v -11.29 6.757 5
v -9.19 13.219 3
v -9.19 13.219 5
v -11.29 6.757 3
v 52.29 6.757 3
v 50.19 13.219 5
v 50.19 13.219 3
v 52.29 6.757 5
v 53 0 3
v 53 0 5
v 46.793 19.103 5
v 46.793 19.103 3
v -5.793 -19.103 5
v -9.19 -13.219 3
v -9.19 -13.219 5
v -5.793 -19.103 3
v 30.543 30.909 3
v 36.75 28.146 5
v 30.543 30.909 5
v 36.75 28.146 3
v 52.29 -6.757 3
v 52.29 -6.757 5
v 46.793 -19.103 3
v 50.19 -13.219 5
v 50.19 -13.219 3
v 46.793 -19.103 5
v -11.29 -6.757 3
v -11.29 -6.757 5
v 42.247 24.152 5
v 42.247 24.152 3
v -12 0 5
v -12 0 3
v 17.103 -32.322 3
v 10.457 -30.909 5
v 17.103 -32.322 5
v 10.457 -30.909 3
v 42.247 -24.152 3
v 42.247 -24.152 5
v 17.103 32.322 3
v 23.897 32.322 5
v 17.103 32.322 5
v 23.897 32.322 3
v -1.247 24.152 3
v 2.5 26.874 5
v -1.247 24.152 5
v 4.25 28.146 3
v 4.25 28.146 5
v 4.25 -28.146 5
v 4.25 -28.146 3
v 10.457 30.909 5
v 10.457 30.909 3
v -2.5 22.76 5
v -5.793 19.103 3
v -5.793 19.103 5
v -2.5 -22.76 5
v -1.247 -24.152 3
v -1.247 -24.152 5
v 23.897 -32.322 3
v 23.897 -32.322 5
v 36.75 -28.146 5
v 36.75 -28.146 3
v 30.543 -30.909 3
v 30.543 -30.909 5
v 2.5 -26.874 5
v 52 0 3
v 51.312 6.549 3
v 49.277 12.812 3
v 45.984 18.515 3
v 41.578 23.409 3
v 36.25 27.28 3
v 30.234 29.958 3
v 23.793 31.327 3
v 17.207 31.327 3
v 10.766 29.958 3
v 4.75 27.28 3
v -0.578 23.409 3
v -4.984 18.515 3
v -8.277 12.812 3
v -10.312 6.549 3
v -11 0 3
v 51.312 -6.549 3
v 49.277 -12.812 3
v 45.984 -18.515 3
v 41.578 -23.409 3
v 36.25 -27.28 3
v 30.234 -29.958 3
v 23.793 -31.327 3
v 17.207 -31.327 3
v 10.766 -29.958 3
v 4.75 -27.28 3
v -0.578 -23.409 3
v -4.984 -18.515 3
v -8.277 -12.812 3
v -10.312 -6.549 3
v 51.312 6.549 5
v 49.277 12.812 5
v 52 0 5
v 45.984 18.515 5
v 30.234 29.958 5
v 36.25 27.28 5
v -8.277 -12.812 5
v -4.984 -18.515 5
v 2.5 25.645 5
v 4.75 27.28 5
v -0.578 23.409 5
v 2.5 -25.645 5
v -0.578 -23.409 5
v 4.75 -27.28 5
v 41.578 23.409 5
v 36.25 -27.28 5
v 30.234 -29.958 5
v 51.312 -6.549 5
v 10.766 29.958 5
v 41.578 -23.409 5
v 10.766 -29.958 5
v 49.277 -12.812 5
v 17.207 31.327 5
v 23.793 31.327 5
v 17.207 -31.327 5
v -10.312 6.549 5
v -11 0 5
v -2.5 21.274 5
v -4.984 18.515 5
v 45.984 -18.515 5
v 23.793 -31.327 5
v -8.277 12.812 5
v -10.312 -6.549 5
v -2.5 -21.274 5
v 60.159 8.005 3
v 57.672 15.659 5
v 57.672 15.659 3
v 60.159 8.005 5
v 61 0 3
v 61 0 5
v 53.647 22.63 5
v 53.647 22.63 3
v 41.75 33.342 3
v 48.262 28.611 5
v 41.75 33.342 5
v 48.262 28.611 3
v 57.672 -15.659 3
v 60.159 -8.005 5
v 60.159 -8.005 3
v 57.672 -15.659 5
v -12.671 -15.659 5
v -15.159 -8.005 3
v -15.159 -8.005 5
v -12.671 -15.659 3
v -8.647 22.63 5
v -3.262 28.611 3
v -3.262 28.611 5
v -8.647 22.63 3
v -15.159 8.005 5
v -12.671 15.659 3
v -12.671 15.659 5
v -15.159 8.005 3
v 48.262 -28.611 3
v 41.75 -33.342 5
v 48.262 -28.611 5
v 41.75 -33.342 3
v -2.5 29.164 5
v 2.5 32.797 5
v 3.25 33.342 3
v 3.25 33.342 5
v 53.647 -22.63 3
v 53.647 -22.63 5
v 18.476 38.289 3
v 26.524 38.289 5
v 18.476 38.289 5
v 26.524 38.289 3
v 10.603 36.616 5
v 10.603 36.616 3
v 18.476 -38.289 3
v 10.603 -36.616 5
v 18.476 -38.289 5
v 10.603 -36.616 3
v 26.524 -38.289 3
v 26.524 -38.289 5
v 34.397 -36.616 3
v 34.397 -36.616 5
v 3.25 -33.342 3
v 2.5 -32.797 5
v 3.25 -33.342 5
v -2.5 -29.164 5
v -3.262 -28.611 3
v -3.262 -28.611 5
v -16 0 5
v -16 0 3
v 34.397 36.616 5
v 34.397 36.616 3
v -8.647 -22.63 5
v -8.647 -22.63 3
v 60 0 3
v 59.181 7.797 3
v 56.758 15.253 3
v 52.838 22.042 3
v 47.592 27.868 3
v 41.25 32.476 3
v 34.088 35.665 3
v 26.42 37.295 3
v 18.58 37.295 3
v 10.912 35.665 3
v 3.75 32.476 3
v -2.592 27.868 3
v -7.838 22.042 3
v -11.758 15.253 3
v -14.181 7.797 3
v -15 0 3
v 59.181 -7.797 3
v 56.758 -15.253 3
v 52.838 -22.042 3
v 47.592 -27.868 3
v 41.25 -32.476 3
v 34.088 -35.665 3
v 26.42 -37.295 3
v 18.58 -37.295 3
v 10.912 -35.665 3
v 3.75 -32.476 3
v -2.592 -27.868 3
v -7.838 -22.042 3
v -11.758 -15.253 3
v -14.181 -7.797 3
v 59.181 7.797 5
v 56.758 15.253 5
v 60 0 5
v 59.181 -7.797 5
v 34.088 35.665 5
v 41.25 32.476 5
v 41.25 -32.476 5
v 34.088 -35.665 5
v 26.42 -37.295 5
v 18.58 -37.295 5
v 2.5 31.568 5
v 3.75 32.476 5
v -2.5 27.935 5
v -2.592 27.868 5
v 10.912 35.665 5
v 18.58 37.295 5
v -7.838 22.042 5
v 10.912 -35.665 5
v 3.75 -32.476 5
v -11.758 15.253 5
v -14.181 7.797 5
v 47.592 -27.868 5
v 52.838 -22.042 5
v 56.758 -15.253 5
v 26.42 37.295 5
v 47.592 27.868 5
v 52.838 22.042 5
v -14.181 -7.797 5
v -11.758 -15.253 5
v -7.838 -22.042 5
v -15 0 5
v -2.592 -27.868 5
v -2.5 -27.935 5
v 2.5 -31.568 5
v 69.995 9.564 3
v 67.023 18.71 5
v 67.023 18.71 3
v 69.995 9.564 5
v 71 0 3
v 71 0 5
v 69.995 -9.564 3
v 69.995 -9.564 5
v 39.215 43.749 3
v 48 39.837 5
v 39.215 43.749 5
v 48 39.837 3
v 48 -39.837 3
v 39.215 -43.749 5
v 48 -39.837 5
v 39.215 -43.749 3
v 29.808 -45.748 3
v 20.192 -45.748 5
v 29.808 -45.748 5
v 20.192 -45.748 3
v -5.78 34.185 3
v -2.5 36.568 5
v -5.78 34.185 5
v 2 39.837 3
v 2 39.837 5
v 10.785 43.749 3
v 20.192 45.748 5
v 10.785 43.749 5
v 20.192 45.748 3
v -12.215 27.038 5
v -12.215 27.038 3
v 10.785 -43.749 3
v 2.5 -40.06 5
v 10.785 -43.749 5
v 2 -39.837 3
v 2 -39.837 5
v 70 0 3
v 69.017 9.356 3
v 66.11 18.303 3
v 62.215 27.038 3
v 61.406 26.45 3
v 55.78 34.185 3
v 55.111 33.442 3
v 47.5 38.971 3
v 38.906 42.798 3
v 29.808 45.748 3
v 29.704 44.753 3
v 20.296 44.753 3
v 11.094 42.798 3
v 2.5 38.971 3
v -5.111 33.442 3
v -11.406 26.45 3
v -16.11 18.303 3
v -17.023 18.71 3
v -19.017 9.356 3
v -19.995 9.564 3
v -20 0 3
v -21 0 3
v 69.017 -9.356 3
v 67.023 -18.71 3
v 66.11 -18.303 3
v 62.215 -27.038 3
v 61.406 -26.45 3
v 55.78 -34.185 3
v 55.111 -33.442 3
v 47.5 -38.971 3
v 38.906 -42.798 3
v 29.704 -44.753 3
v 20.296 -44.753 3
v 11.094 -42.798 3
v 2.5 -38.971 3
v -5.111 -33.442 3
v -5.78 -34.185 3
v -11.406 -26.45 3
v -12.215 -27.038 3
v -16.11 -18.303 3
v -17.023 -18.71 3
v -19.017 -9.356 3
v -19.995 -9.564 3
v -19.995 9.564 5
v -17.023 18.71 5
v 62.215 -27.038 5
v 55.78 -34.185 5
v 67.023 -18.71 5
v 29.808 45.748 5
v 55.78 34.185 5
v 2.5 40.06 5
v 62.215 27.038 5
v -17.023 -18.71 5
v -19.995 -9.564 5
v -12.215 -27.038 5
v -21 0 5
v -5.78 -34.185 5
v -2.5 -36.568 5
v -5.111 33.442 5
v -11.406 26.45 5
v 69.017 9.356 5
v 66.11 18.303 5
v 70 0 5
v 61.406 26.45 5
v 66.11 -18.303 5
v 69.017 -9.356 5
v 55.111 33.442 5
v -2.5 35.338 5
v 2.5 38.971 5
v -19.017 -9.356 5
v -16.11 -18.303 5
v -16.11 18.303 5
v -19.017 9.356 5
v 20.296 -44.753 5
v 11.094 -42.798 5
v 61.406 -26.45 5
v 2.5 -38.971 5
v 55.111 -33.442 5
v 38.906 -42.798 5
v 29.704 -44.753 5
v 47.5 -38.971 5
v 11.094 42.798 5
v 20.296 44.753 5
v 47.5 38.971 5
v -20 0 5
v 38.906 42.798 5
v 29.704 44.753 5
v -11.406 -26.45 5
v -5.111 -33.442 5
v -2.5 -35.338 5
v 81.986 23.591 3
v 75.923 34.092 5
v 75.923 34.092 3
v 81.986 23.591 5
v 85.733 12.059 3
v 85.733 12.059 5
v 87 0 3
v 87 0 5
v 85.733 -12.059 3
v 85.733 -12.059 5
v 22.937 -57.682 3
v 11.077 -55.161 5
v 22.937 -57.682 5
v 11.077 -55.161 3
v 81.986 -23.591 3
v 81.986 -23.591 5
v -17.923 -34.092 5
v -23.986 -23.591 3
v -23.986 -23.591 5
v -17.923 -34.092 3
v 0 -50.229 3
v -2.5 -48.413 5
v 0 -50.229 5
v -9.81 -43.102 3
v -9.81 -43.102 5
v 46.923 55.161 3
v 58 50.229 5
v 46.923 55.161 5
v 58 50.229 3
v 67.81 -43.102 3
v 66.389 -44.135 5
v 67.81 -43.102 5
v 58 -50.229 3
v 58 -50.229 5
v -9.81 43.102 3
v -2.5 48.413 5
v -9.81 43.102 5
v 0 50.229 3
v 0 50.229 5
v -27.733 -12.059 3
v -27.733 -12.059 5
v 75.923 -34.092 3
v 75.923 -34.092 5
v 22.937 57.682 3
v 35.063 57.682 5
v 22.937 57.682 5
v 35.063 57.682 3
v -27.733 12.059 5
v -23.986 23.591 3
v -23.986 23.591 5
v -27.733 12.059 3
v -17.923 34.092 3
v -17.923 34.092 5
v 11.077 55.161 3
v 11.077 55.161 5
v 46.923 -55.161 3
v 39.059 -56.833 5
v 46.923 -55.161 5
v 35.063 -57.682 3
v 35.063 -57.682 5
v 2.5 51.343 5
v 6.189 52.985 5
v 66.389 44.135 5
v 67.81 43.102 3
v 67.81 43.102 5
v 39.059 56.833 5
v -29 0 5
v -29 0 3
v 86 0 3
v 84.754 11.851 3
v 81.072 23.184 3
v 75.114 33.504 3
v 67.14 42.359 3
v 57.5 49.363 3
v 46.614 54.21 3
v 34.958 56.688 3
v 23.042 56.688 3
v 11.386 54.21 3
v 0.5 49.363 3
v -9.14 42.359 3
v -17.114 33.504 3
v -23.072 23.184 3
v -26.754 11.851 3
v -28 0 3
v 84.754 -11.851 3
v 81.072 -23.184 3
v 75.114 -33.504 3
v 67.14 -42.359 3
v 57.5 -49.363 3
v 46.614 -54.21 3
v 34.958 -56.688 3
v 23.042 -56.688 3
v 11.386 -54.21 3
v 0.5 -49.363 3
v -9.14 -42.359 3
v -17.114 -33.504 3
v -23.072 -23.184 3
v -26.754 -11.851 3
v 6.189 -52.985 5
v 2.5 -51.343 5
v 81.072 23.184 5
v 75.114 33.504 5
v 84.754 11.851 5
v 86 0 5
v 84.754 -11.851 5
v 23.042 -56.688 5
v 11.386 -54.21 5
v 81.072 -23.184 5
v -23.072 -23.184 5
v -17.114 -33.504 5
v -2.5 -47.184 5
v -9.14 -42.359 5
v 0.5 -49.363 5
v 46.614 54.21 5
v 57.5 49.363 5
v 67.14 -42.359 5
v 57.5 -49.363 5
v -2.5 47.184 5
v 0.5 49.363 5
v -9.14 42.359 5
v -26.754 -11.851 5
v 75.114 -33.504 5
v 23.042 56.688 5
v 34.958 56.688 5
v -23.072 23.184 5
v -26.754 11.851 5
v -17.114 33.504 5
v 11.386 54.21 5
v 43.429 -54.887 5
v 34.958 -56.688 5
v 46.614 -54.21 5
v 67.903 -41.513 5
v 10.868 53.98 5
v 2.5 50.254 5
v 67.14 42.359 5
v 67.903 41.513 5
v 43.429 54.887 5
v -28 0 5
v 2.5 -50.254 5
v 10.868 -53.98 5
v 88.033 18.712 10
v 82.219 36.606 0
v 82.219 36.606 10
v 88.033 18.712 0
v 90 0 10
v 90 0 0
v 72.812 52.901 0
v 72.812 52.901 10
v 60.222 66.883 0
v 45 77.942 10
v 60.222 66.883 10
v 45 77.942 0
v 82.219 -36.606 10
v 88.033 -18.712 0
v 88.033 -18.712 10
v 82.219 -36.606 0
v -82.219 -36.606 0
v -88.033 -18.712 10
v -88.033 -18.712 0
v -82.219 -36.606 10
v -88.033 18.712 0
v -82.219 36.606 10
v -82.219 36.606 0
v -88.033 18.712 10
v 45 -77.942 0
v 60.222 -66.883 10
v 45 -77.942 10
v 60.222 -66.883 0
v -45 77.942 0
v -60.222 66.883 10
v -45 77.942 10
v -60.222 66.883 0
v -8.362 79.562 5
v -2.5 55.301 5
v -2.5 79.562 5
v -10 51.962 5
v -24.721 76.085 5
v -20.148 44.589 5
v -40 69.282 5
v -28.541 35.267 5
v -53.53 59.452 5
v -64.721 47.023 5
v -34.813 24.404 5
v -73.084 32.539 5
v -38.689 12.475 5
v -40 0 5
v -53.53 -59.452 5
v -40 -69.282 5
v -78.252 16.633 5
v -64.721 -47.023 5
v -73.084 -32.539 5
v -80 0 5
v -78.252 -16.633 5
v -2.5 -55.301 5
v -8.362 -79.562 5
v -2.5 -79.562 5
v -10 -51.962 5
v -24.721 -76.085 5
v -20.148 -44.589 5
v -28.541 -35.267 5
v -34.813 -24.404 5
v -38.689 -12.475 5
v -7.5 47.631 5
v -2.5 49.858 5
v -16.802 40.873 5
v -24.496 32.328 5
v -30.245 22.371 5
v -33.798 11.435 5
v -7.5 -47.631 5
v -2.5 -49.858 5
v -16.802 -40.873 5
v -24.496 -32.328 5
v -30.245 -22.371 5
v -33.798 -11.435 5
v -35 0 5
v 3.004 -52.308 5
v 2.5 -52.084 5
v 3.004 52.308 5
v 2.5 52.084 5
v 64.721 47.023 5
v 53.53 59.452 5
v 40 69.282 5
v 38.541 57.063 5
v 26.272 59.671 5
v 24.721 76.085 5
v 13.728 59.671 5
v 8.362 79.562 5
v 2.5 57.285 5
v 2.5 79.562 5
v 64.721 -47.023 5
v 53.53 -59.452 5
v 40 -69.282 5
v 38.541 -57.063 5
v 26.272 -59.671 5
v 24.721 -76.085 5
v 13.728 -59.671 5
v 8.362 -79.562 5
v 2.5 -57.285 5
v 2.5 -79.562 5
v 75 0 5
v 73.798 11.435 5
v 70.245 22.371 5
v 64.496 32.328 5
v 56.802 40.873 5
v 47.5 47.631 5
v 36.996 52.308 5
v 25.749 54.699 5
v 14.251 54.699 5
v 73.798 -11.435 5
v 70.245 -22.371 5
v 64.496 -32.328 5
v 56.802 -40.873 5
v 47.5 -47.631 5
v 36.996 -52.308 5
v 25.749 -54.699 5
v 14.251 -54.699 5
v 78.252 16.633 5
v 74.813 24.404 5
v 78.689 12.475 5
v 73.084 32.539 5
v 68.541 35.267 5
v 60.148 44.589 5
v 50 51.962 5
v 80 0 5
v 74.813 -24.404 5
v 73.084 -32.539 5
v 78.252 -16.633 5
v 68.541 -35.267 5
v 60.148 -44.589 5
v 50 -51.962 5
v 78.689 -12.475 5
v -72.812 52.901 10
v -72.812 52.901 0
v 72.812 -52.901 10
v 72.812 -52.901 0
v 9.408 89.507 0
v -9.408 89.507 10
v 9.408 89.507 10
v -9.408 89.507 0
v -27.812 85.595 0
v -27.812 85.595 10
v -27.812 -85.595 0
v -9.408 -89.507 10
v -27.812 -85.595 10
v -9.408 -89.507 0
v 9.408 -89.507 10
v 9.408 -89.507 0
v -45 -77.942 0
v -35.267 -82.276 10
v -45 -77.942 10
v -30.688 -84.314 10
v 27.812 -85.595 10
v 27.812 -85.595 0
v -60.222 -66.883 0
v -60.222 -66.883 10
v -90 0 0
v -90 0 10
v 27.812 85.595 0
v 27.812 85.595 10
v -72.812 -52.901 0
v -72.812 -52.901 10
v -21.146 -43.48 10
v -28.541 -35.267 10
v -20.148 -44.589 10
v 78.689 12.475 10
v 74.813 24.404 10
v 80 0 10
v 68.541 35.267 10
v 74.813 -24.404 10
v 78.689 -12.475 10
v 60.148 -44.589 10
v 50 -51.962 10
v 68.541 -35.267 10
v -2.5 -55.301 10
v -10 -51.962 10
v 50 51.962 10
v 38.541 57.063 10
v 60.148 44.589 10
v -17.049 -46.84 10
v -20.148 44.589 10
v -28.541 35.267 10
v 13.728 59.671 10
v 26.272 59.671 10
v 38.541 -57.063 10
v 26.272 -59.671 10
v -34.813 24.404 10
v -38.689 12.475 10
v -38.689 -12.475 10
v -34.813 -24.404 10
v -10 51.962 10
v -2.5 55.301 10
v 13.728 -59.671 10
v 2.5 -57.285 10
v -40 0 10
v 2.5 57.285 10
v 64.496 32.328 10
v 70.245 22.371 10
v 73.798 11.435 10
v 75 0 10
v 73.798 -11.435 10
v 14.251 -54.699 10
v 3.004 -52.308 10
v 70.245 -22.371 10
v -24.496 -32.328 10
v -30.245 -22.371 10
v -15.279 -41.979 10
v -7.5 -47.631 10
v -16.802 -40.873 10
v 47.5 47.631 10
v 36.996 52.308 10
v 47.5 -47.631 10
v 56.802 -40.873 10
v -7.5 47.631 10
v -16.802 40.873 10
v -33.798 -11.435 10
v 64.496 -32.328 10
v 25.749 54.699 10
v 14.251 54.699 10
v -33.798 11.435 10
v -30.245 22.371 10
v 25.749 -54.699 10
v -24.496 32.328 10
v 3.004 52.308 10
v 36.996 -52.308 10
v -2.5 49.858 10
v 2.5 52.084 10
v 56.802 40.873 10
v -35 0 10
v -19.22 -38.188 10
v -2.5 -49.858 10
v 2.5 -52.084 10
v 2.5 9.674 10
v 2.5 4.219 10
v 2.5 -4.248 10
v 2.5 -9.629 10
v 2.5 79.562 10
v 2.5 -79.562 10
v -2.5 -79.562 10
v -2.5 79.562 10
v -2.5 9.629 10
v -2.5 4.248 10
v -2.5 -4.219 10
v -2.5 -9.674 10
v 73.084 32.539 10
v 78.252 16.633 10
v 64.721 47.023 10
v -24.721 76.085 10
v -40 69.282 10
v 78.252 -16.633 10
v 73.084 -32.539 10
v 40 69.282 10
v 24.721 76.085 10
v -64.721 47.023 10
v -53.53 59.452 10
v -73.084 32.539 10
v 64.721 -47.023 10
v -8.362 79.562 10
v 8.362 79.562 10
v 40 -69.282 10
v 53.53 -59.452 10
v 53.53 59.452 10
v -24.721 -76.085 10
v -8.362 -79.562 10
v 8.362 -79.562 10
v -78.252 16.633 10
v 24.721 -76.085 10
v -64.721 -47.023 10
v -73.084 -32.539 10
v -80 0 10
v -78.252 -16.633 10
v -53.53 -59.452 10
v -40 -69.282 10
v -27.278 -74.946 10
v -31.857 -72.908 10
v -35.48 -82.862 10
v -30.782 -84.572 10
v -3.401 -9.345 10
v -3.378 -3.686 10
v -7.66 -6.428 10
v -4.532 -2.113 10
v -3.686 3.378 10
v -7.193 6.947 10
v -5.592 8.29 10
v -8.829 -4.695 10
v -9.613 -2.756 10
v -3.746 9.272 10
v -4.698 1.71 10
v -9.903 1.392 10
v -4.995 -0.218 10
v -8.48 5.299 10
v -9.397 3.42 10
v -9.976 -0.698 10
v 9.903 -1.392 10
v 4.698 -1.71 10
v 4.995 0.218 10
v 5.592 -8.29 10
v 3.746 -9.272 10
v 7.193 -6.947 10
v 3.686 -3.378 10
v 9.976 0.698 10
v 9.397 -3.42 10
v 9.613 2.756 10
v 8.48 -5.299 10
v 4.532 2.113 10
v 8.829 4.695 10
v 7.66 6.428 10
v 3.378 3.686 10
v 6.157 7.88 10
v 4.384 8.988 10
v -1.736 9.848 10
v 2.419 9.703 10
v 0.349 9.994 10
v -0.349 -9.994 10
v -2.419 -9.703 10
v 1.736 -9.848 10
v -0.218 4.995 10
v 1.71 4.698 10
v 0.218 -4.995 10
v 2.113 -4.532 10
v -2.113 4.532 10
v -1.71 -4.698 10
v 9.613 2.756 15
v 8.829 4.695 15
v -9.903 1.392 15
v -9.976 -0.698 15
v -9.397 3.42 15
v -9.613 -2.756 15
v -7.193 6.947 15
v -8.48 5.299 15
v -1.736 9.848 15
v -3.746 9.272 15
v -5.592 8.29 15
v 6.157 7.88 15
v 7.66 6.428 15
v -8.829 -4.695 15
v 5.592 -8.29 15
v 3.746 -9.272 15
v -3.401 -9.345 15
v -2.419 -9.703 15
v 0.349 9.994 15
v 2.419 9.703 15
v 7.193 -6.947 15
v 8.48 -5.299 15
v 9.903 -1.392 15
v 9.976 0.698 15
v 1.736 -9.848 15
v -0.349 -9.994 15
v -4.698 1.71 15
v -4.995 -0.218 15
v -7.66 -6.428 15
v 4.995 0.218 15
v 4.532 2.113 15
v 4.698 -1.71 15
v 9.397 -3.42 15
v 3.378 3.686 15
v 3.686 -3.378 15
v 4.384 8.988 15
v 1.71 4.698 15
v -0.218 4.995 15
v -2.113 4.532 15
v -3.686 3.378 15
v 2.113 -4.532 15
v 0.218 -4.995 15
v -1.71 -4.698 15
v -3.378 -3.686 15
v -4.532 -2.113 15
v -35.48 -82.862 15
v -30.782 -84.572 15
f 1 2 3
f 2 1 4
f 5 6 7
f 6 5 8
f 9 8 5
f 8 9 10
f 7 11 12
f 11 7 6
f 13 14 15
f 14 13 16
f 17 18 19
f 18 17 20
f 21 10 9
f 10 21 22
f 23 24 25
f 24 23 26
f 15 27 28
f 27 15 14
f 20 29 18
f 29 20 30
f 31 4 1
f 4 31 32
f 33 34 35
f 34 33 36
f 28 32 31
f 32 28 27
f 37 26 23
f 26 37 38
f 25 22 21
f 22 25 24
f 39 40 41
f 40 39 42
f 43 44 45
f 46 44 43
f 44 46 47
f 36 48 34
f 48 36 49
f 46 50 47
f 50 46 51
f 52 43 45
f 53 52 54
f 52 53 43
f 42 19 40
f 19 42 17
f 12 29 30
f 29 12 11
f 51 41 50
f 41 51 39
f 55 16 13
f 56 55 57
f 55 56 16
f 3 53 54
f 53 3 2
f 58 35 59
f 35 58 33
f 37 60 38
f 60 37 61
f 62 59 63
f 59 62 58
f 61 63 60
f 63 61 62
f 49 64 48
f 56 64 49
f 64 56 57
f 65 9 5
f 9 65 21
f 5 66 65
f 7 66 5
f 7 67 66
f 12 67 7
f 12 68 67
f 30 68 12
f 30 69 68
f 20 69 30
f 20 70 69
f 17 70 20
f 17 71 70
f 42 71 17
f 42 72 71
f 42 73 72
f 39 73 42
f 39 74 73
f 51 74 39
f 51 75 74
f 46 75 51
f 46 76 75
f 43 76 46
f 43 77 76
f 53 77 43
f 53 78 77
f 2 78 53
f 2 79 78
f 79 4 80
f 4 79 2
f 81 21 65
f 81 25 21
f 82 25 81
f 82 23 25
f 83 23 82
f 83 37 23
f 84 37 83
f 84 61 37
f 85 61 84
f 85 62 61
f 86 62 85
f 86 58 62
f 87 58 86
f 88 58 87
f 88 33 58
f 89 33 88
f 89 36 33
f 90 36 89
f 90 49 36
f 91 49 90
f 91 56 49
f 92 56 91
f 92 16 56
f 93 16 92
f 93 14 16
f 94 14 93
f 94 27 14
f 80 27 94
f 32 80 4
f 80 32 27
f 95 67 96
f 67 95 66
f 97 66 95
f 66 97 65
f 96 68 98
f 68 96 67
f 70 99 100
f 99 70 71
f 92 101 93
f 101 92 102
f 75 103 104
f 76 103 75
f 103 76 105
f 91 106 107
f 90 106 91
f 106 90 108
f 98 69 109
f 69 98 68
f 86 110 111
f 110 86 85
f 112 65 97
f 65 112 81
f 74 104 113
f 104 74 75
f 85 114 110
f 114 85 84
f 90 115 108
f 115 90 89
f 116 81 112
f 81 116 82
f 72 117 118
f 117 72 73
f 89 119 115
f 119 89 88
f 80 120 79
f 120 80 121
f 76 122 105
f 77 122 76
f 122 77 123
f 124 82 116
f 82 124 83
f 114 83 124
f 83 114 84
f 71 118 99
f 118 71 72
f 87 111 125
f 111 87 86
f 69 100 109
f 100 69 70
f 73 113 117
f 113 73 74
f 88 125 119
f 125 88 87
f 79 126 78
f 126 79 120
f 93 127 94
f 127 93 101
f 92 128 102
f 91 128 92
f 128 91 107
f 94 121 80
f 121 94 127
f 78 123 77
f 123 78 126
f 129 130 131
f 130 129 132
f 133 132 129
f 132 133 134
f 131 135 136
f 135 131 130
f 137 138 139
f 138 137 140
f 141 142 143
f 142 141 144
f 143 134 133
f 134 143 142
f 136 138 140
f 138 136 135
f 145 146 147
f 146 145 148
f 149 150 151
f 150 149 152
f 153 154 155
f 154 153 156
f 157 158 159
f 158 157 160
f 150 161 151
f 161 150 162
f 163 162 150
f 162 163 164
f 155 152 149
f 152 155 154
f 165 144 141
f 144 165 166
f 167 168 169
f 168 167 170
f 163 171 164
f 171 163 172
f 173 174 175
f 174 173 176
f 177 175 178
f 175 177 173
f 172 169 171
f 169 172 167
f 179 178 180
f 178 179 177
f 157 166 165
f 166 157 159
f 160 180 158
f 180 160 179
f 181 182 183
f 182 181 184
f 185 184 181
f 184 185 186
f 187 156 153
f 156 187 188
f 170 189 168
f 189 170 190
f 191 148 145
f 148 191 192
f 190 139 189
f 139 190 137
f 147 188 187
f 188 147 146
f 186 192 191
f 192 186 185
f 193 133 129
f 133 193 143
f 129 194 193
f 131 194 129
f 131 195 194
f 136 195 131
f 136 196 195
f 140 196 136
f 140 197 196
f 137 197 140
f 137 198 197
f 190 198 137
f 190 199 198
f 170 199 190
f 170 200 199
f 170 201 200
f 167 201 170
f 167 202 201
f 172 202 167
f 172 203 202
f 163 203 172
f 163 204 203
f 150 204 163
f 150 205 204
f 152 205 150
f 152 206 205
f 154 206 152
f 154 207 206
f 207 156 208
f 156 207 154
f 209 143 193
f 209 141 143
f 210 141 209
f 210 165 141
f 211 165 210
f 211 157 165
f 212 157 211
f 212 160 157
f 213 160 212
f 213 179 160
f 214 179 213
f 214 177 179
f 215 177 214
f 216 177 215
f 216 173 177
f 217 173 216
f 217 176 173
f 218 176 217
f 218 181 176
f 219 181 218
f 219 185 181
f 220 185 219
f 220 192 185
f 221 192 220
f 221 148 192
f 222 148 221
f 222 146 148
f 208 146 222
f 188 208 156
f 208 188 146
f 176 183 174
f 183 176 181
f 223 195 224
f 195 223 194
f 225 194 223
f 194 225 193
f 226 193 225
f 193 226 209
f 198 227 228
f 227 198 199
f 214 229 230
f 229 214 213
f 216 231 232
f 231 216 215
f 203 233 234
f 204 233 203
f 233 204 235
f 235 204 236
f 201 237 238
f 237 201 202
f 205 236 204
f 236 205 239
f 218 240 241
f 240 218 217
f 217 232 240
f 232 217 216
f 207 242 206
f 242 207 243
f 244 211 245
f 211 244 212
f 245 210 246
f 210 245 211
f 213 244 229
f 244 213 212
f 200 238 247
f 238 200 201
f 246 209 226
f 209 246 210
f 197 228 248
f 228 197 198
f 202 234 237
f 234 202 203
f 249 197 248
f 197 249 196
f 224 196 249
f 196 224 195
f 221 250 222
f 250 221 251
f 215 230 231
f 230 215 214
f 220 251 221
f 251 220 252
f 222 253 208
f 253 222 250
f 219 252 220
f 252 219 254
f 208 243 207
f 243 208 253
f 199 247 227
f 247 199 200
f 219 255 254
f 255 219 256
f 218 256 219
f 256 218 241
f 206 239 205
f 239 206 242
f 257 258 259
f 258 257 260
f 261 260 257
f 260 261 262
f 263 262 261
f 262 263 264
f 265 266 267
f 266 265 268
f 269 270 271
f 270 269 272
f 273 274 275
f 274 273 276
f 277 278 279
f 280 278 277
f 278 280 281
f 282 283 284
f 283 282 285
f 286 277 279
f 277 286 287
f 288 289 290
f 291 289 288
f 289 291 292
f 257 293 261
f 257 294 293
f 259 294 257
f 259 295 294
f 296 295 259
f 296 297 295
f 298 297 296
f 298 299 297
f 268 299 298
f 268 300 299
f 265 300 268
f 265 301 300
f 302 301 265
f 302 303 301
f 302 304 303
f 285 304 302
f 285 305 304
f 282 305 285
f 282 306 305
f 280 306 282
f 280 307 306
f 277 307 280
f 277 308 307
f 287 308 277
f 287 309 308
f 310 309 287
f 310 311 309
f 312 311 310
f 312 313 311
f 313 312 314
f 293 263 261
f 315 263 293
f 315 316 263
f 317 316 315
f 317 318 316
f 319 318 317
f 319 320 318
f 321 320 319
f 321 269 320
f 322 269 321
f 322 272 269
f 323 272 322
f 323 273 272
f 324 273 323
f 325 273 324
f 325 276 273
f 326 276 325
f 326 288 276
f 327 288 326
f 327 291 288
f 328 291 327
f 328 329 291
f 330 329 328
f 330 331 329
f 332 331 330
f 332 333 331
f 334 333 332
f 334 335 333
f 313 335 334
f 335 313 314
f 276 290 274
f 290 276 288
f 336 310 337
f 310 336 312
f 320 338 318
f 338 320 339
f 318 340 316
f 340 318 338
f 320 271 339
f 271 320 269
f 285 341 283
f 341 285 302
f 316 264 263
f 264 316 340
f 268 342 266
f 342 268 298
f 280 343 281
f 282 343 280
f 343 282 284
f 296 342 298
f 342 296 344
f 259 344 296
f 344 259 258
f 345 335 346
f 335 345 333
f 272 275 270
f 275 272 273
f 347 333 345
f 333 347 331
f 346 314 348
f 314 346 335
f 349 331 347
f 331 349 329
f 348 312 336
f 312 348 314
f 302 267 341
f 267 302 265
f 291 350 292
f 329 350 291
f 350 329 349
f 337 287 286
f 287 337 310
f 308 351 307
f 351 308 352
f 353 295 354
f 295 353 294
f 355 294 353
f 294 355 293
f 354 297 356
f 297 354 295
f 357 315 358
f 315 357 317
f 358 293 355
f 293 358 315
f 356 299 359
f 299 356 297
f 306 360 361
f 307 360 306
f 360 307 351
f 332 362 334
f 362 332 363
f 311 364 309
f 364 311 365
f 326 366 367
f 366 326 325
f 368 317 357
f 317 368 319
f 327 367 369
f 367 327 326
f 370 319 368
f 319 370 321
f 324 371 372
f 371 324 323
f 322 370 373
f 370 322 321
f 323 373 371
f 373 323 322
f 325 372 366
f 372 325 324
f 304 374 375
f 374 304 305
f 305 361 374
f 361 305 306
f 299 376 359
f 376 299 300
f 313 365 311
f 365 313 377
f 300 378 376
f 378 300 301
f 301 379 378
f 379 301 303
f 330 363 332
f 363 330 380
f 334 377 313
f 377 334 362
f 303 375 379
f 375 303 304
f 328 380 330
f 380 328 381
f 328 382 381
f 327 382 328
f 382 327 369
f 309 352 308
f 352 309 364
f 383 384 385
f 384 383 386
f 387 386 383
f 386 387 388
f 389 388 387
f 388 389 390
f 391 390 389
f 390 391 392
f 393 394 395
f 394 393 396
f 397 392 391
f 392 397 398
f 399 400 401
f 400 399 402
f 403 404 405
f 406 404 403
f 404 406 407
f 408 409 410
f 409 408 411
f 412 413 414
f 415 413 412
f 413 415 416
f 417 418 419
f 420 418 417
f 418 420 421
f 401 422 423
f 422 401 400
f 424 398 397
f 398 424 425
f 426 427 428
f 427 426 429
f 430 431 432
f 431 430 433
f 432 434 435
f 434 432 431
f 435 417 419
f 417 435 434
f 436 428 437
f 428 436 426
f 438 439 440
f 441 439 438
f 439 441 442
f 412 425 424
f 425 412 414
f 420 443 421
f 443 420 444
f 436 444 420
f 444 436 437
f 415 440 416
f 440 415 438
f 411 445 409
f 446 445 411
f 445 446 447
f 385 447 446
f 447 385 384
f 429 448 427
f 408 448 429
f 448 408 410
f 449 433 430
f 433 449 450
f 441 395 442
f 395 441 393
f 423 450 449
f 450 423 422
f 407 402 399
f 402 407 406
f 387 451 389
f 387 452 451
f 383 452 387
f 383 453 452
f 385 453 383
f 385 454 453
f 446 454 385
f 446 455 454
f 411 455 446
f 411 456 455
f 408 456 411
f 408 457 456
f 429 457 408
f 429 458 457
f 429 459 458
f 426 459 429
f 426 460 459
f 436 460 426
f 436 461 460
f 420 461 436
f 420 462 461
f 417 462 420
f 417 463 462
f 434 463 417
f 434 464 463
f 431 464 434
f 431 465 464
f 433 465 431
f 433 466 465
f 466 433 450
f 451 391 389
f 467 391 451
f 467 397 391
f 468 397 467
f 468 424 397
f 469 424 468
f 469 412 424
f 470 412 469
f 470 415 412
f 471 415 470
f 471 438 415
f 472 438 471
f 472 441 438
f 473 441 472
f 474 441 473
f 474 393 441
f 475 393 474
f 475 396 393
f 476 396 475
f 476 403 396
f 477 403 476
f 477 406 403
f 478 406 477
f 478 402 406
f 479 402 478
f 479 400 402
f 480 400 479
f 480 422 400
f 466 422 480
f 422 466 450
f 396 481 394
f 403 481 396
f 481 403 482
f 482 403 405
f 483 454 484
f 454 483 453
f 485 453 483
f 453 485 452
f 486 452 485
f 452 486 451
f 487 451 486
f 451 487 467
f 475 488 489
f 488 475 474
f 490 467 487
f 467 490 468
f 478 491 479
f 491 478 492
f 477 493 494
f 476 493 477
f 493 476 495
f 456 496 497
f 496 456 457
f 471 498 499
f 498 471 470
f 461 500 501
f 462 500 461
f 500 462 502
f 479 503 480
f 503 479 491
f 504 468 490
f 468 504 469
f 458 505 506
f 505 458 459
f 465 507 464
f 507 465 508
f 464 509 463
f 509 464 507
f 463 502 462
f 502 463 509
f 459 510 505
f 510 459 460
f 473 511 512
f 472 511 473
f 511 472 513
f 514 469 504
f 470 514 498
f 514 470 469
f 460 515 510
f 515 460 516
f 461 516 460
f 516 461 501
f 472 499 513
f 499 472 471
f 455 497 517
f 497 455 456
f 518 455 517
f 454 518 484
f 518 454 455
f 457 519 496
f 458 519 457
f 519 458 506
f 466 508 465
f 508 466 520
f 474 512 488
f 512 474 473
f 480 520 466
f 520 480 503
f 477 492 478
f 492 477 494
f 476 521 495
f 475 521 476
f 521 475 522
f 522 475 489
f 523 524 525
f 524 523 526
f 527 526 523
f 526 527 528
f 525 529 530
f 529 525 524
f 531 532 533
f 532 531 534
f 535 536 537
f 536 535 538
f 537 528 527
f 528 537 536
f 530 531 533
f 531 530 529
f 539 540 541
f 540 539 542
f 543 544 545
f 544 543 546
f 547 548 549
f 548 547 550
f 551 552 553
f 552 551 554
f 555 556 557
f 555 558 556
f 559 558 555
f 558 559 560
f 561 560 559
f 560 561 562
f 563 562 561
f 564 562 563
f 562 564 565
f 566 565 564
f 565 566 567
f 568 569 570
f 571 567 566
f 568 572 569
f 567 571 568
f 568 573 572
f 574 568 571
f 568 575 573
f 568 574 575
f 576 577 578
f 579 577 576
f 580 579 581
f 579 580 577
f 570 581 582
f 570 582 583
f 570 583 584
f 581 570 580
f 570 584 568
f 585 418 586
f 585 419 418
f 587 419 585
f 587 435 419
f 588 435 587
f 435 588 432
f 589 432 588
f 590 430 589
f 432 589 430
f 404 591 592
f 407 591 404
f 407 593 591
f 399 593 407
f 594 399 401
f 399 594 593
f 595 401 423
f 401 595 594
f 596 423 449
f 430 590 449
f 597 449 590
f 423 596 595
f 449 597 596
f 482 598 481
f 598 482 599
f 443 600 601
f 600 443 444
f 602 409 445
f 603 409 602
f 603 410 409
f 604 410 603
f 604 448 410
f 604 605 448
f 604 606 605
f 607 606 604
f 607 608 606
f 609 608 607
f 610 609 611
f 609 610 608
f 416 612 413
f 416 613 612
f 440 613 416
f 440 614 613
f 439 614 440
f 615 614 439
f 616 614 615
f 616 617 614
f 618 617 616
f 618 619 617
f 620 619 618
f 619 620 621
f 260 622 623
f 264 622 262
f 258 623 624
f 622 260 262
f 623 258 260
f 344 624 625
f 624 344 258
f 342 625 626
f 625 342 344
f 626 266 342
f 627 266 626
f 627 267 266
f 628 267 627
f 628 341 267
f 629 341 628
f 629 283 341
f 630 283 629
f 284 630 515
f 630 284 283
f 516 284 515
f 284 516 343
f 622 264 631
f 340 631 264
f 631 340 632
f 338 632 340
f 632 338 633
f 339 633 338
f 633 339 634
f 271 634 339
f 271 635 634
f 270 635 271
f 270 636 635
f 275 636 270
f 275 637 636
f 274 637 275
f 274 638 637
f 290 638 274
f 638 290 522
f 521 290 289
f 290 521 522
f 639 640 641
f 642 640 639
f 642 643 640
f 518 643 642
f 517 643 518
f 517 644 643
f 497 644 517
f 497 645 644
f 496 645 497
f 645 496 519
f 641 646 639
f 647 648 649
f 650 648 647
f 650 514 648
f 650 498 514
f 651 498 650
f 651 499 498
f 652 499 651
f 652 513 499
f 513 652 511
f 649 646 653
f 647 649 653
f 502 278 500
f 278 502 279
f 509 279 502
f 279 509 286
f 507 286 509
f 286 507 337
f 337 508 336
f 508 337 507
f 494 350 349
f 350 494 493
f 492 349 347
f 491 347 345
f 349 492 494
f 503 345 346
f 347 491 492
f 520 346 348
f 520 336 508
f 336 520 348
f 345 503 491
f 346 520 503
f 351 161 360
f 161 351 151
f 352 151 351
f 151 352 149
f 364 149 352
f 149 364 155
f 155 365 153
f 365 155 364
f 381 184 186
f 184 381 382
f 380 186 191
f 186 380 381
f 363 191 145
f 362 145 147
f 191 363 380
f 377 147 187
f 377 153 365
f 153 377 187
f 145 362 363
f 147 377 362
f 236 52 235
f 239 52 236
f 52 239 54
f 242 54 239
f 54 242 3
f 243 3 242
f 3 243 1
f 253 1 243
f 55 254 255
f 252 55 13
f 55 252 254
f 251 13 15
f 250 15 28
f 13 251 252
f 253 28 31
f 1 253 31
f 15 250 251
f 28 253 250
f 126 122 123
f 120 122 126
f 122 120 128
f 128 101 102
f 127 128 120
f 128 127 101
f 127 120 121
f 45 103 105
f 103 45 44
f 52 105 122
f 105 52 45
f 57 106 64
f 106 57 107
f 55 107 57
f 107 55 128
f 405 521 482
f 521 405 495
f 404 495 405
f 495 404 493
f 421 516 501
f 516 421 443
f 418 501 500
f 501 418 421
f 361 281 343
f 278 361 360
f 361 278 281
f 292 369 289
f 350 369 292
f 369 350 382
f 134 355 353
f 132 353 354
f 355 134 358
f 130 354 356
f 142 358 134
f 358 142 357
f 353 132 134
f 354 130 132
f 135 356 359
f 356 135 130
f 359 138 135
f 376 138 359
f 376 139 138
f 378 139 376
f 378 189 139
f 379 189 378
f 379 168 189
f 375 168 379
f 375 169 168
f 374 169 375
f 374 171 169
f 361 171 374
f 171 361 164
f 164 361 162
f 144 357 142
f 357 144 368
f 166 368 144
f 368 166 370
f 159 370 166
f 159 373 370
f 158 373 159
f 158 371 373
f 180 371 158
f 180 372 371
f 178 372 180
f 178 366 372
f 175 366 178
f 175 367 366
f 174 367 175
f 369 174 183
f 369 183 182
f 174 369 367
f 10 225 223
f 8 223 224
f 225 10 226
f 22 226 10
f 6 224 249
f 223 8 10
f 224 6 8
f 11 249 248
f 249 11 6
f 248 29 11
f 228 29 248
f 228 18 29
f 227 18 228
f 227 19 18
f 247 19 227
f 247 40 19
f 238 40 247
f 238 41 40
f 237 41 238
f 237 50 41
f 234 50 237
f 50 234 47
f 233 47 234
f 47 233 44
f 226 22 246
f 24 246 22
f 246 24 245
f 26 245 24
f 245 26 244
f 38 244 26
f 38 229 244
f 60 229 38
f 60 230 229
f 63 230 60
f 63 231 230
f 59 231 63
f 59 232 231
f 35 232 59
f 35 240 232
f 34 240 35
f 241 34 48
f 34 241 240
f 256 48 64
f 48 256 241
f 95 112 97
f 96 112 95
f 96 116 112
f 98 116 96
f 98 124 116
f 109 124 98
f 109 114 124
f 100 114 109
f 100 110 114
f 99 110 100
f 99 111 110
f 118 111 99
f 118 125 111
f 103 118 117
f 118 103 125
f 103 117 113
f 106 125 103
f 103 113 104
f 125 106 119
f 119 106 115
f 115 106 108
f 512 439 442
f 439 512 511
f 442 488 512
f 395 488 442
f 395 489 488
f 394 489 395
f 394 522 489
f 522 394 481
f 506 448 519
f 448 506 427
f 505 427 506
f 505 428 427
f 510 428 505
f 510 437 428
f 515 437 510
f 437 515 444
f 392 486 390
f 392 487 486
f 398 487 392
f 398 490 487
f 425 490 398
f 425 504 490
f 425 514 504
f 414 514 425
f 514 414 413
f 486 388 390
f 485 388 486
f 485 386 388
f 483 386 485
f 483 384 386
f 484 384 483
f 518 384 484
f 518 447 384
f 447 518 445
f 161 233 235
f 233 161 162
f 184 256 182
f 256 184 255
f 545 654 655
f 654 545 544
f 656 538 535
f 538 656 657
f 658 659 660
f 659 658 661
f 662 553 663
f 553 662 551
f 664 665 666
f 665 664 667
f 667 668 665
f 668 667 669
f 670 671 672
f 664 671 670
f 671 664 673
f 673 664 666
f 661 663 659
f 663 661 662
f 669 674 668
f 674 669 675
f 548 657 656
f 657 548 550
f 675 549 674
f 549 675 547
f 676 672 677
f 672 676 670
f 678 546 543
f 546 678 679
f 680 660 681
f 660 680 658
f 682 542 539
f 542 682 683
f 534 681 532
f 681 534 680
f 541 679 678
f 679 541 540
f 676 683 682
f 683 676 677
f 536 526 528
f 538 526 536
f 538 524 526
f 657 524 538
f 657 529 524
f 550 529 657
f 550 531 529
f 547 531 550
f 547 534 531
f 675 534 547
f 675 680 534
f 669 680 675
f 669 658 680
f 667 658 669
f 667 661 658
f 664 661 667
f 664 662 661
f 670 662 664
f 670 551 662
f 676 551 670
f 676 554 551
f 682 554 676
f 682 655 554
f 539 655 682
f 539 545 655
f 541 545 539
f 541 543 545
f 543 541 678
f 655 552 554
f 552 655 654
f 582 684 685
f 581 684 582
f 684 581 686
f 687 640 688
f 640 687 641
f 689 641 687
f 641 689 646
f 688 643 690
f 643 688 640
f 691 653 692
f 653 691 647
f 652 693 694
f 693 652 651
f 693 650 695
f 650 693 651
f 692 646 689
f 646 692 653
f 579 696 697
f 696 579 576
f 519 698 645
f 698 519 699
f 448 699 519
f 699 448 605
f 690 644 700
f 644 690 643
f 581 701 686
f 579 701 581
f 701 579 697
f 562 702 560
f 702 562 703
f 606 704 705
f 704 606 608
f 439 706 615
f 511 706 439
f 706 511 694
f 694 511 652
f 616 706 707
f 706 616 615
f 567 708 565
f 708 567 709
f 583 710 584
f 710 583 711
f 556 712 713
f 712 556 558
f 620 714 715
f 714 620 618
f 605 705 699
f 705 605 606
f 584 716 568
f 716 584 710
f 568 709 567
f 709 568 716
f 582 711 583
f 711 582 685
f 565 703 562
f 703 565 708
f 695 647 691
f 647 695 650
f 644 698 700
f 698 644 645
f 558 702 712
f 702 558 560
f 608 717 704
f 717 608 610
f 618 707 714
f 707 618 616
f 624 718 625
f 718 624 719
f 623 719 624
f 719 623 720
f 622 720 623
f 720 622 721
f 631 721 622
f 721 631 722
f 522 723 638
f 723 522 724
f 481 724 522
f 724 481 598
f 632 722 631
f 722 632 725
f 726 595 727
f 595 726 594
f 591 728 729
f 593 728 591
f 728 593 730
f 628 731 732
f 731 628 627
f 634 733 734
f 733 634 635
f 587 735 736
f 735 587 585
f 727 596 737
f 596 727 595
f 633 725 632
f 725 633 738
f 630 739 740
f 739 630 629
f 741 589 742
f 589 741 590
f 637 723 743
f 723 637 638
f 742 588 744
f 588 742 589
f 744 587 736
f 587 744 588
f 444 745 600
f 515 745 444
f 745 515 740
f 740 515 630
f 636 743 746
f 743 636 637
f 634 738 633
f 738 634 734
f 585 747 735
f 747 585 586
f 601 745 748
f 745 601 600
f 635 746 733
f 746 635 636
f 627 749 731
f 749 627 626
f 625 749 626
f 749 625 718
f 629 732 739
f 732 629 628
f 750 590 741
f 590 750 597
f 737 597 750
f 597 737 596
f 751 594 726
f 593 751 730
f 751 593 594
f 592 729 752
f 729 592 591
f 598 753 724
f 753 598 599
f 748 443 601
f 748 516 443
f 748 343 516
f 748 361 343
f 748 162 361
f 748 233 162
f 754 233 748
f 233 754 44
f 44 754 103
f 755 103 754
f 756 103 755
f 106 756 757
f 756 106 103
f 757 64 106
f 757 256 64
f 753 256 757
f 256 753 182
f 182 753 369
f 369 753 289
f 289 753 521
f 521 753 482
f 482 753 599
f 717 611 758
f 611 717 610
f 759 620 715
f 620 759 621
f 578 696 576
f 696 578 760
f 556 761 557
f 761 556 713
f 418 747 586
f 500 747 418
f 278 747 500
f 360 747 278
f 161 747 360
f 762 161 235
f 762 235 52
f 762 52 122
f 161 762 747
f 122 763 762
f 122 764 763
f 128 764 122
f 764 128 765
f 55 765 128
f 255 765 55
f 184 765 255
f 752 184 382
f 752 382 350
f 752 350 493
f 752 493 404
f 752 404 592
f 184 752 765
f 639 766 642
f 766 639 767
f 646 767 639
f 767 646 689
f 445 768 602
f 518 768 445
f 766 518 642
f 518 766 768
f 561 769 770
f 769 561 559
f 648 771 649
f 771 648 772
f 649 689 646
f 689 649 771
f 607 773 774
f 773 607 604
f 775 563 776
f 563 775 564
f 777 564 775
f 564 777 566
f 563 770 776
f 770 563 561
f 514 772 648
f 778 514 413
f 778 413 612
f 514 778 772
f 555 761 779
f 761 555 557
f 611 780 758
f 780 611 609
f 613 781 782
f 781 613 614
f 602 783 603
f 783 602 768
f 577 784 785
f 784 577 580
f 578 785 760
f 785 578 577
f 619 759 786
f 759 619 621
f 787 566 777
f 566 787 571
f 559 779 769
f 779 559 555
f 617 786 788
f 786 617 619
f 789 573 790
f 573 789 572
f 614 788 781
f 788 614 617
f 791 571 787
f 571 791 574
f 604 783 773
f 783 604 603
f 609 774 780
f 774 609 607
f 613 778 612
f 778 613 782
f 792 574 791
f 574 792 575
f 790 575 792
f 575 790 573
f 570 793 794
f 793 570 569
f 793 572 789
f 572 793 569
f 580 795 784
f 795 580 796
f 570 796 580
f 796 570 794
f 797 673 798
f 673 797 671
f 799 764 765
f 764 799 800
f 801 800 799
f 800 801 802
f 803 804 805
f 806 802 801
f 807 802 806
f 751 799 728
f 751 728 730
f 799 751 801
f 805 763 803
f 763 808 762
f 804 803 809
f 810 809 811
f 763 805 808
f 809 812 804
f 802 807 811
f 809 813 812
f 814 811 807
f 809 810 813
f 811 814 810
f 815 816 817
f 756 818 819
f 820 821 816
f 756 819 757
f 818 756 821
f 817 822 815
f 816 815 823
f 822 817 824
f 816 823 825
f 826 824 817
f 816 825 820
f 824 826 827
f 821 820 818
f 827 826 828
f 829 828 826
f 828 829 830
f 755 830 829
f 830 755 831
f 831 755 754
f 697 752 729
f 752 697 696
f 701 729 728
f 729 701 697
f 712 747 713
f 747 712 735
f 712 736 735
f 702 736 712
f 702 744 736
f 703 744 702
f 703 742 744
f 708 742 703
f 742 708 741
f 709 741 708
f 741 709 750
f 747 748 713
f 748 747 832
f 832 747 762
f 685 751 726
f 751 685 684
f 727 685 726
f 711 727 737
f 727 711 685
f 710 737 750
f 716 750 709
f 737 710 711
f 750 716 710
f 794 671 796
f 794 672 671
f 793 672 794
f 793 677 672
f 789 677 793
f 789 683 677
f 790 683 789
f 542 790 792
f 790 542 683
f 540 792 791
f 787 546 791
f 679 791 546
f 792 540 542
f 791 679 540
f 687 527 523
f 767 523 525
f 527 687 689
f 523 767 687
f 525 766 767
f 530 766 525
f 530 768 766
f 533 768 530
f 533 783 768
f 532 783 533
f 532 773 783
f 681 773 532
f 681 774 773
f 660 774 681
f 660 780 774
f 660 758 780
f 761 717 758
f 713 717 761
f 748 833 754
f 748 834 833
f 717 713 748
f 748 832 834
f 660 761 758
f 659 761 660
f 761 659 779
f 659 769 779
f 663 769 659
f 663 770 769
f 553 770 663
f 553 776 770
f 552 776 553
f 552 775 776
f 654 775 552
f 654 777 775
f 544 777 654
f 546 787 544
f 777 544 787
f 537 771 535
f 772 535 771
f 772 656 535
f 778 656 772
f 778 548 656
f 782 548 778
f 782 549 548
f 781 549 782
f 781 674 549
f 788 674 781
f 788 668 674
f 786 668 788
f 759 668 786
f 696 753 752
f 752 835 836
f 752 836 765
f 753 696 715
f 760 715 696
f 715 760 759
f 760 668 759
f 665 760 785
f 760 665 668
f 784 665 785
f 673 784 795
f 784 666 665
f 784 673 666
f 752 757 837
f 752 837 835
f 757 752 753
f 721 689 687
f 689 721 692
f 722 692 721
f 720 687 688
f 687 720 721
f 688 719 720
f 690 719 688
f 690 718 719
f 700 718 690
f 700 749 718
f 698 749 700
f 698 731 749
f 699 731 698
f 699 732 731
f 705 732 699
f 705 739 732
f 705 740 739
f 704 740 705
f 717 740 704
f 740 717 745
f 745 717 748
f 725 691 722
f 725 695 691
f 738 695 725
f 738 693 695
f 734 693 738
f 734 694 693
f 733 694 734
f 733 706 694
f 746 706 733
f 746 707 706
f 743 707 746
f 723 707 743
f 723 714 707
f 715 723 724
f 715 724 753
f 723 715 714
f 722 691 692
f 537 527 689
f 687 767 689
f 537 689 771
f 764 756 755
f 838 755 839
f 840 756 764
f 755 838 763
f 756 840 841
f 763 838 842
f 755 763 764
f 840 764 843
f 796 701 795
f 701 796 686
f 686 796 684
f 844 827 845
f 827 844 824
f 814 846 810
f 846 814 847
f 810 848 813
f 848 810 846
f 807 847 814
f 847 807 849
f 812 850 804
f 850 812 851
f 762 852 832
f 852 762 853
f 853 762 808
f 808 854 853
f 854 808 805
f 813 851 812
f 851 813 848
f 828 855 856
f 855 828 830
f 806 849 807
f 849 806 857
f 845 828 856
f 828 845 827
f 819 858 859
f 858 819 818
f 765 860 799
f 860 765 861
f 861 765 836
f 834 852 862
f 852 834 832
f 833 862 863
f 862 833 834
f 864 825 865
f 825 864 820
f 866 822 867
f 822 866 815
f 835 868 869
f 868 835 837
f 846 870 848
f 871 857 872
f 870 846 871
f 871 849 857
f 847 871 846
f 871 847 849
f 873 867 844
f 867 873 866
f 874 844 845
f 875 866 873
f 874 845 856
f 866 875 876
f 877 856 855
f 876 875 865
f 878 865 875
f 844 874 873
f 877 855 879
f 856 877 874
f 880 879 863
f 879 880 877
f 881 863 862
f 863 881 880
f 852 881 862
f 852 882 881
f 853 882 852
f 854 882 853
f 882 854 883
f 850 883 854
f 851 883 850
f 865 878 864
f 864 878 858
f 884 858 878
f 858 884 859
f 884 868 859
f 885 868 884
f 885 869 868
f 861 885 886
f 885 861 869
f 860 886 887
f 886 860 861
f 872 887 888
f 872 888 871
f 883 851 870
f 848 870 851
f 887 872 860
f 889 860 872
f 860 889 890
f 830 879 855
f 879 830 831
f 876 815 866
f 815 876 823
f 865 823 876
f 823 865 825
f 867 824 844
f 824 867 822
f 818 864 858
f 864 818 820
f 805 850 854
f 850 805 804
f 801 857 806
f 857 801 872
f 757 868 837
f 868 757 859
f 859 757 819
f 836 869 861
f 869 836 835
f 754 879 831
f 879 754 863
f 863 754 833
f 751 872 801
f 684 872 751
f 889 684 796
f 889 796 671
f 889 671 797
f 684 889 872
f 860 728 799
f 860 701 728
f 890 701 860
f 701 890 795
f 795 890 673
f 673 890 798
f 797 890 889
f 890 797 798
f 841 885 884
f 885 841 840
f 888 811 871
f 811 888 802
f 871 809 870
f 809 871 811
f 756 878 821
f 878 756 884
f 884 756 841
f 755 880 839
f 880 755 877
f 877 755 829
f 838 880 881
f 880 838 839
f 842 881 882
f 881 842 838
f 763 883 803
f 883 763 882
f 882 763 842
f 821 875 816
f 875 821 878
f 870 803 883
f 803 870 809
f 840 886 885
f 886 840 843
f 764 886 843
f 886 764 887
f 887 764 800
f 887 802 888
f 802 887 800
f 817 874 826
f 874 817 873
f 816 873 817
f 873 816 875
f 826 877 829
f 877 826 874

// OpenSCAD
// Created: 2013-03-10
// Author: Peter Withers

#baseTympan();
topRete();
pointerAlidade();

module pointerAlidade(){
	rotate(a=[0,0,160]) difference(){
		translate([0, 0, 10]) {
			union(){
				cylinder(5, 10, 10);
				cube(size = [5, 90, 5], center = false);
			}
		}
		cylinder(20, 5, 5);
	}
}

module topRete(){
	difference(){
		translate([0, 0, 5]) {
			cylinder(5, 90, 90);
		}
		difference(){
			cylinder(15, 80, 80);
			union() {
				cube(size = [5, 200, 30], center = true);
				translate([20, 0, 0]) difference(){
					cylinder(15, 60, 60);
					cylinder(15, 55, 55);
				}
			}
		}
	}
}

module baseTympan(){
	difference(){
		cylinder(5,90, 90);
		union(){
			for(ringNumber = [1, 5, 10, 18]) {
				markerRing(30 + ringNumber * 1.5, 20 + ringNumber / 2, 0);
			}
		}
	}
}

module markerRing(dia, offsetX, offsetY){
	translate([offsetX,offsetY,3]) {
		difference(){
			cylinder(5,dia+1, dia+1);
			translate([0,0,-1]) cylinder(7,dia, dia);
		}
	}
}
